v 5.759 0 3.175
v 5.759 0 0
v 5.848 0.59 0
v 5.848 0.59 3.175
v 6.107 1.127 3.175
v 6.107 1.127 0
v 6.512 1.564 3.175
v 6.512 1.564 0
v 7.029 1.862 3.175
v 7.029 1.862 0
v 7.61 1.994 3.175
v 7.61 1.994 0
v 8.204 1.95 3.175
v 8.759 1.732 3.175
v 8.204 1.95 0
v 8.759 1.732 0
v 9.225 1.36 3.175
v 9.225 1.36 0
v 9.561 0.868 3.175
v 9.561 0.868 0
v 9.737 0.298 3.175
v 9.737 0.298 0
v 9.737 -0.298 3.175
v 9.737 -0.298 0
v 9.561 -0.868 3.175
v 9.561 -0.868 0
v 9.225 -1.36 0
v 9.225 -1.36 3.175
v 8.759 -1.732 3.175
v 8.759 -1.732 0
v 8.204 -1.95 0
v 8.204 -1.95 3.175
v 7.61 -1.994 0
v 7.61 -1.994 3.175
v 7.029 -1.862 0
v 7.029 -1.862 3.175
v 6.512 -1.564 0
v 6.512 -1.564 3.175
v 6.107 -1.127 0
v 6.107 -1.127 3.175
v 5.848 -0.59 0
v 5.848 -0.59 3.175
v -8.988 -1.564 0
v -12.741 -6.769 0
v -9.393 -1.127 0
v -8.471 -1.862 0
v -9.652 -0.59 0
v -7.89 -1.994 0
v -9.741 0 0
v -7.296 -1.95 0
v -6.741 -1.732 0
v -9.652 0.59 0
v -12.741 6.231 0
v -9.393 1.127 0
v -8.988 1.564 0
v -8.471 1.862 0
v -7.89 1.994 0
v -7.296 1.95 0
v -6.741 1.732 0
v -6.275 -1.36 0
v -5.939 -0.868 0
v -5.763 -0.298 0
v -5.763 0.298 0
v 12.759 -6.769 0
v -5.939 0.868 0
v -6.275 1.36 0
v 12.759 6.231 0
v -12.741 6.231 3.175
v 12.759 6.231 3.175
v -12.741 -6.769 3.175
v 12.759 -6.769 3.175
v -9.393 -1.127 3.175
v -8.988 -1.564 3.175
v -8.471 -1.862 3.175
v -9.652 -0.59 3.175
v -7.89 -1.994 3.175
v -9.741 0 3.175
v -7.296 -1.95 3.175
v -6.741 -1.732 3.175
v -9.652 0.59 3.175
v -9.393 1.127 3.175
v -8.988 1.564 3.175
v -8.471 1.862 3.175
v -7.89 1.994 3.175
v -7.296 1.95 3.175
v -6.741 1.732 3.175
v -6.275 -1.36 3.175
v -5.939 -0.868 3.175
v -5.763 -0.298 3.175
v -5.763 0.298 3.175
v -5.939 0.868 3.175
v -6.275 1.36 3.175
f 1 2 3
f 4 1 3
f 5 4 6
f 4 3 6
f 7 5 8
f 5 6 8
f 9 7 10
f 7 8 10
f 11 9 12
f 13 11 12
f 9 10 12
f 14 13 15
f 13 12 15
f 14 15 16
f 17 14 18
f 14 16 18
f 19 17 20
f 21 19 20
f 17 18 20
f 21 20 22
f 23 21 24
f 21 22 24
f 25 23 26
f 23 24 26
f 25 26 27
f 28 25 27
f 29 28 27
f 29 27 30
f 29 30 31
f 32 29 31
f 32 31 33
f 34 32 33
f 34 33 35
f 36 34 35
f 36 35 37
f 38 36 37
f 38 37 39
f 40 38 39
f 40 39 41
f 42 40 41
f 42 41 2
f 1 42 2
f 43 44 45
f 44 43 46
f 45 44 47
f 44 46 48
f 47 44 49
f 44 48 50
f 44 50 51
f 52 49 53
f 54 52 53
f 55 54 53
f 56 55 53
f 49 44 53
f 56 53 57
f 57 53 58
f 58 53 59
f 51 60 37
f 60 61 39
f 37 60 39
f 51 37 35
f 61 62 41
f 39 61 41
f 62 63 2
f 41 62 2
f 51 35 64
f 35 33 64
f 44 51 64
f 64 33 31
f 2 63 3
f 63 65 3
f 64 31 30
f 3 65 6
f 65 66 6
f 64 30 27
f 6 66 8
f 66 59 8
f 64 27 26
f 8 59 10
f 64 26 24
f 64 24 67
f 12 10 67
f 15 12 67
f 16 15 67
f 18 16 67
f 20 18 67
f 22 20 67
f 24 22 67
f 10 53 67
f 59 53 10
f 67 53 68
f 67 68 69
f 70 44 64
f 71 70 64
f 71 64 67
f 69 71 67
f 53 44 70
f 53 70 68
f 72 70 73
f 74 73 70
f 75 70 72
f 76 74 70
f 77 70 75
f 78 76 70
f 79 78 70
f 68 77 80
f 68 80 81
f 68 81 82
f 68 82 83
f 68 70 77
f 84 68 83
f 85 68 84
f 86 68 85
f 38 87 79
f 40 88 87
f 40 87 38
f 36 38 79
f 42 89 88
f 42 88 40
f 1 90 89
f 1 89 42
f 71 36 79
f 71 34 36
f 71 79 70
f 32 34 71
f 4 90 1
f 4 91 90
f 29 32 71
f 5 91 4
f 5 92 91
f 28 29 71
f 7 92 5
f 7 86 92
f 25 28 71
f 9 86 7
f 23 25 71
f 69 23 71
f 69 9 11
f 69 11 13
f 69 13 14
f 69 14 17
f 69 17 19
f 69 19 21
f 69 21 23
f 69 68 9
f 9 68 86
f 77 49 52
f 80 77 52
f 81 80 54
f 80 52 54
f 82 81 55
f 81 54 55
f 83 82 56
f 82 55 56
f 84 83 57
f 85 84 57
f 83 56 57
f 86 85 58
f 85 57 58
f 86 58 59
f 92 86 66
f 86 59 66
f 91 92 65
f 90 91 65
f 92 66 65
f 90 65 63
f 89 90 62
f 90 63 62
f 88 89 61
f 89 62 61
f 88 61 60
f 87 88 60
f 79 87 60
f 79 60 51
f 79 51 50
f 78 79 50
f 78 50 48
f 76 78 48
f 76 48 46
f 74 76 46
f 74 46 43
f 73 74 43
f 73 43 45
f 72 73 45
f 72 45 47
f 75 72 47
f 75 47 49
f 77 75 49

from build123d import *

# Parameters (mm, degrees)
SKETCH1_W           = 25.5
SKETCH1_H           = 13
BOSS_EXTRUDE1_DEPTH = 3.175
SKETCH2_R           = 2
CUT_EXTRUDE1_DEPTH  = 15.788505467


with BuildPart() as part:
    # Sketch1 → Boss-Extrude1 (new body)
    with BuildSketch(Plane.XY):
        with Locations((0.009203008, -0.269195489)):
            Rectangle(SKETCH1_W, SKETCH1_H)
    extrude(amount=BOSS_EXTRUDE1_DEPTH)

    # Sketch2 → Cut-Extrude1 (cut, through all)
    with BuildSketch(Plane(origin=(0, 0, 0), x_dir=(-1, 0, 0), z_dir=(0, 0, -1))):
        with Locations((-7.759203008, 0)):
            Circle(SKETCH2_R)
        with Locations((7.740796992, 0)):
            Circle(SKETCH2_R)
    extrude(amount=-CUT_EXTRUDE1_DEPTH, mode=Mode.SUBTRACT)


solid = part.part
